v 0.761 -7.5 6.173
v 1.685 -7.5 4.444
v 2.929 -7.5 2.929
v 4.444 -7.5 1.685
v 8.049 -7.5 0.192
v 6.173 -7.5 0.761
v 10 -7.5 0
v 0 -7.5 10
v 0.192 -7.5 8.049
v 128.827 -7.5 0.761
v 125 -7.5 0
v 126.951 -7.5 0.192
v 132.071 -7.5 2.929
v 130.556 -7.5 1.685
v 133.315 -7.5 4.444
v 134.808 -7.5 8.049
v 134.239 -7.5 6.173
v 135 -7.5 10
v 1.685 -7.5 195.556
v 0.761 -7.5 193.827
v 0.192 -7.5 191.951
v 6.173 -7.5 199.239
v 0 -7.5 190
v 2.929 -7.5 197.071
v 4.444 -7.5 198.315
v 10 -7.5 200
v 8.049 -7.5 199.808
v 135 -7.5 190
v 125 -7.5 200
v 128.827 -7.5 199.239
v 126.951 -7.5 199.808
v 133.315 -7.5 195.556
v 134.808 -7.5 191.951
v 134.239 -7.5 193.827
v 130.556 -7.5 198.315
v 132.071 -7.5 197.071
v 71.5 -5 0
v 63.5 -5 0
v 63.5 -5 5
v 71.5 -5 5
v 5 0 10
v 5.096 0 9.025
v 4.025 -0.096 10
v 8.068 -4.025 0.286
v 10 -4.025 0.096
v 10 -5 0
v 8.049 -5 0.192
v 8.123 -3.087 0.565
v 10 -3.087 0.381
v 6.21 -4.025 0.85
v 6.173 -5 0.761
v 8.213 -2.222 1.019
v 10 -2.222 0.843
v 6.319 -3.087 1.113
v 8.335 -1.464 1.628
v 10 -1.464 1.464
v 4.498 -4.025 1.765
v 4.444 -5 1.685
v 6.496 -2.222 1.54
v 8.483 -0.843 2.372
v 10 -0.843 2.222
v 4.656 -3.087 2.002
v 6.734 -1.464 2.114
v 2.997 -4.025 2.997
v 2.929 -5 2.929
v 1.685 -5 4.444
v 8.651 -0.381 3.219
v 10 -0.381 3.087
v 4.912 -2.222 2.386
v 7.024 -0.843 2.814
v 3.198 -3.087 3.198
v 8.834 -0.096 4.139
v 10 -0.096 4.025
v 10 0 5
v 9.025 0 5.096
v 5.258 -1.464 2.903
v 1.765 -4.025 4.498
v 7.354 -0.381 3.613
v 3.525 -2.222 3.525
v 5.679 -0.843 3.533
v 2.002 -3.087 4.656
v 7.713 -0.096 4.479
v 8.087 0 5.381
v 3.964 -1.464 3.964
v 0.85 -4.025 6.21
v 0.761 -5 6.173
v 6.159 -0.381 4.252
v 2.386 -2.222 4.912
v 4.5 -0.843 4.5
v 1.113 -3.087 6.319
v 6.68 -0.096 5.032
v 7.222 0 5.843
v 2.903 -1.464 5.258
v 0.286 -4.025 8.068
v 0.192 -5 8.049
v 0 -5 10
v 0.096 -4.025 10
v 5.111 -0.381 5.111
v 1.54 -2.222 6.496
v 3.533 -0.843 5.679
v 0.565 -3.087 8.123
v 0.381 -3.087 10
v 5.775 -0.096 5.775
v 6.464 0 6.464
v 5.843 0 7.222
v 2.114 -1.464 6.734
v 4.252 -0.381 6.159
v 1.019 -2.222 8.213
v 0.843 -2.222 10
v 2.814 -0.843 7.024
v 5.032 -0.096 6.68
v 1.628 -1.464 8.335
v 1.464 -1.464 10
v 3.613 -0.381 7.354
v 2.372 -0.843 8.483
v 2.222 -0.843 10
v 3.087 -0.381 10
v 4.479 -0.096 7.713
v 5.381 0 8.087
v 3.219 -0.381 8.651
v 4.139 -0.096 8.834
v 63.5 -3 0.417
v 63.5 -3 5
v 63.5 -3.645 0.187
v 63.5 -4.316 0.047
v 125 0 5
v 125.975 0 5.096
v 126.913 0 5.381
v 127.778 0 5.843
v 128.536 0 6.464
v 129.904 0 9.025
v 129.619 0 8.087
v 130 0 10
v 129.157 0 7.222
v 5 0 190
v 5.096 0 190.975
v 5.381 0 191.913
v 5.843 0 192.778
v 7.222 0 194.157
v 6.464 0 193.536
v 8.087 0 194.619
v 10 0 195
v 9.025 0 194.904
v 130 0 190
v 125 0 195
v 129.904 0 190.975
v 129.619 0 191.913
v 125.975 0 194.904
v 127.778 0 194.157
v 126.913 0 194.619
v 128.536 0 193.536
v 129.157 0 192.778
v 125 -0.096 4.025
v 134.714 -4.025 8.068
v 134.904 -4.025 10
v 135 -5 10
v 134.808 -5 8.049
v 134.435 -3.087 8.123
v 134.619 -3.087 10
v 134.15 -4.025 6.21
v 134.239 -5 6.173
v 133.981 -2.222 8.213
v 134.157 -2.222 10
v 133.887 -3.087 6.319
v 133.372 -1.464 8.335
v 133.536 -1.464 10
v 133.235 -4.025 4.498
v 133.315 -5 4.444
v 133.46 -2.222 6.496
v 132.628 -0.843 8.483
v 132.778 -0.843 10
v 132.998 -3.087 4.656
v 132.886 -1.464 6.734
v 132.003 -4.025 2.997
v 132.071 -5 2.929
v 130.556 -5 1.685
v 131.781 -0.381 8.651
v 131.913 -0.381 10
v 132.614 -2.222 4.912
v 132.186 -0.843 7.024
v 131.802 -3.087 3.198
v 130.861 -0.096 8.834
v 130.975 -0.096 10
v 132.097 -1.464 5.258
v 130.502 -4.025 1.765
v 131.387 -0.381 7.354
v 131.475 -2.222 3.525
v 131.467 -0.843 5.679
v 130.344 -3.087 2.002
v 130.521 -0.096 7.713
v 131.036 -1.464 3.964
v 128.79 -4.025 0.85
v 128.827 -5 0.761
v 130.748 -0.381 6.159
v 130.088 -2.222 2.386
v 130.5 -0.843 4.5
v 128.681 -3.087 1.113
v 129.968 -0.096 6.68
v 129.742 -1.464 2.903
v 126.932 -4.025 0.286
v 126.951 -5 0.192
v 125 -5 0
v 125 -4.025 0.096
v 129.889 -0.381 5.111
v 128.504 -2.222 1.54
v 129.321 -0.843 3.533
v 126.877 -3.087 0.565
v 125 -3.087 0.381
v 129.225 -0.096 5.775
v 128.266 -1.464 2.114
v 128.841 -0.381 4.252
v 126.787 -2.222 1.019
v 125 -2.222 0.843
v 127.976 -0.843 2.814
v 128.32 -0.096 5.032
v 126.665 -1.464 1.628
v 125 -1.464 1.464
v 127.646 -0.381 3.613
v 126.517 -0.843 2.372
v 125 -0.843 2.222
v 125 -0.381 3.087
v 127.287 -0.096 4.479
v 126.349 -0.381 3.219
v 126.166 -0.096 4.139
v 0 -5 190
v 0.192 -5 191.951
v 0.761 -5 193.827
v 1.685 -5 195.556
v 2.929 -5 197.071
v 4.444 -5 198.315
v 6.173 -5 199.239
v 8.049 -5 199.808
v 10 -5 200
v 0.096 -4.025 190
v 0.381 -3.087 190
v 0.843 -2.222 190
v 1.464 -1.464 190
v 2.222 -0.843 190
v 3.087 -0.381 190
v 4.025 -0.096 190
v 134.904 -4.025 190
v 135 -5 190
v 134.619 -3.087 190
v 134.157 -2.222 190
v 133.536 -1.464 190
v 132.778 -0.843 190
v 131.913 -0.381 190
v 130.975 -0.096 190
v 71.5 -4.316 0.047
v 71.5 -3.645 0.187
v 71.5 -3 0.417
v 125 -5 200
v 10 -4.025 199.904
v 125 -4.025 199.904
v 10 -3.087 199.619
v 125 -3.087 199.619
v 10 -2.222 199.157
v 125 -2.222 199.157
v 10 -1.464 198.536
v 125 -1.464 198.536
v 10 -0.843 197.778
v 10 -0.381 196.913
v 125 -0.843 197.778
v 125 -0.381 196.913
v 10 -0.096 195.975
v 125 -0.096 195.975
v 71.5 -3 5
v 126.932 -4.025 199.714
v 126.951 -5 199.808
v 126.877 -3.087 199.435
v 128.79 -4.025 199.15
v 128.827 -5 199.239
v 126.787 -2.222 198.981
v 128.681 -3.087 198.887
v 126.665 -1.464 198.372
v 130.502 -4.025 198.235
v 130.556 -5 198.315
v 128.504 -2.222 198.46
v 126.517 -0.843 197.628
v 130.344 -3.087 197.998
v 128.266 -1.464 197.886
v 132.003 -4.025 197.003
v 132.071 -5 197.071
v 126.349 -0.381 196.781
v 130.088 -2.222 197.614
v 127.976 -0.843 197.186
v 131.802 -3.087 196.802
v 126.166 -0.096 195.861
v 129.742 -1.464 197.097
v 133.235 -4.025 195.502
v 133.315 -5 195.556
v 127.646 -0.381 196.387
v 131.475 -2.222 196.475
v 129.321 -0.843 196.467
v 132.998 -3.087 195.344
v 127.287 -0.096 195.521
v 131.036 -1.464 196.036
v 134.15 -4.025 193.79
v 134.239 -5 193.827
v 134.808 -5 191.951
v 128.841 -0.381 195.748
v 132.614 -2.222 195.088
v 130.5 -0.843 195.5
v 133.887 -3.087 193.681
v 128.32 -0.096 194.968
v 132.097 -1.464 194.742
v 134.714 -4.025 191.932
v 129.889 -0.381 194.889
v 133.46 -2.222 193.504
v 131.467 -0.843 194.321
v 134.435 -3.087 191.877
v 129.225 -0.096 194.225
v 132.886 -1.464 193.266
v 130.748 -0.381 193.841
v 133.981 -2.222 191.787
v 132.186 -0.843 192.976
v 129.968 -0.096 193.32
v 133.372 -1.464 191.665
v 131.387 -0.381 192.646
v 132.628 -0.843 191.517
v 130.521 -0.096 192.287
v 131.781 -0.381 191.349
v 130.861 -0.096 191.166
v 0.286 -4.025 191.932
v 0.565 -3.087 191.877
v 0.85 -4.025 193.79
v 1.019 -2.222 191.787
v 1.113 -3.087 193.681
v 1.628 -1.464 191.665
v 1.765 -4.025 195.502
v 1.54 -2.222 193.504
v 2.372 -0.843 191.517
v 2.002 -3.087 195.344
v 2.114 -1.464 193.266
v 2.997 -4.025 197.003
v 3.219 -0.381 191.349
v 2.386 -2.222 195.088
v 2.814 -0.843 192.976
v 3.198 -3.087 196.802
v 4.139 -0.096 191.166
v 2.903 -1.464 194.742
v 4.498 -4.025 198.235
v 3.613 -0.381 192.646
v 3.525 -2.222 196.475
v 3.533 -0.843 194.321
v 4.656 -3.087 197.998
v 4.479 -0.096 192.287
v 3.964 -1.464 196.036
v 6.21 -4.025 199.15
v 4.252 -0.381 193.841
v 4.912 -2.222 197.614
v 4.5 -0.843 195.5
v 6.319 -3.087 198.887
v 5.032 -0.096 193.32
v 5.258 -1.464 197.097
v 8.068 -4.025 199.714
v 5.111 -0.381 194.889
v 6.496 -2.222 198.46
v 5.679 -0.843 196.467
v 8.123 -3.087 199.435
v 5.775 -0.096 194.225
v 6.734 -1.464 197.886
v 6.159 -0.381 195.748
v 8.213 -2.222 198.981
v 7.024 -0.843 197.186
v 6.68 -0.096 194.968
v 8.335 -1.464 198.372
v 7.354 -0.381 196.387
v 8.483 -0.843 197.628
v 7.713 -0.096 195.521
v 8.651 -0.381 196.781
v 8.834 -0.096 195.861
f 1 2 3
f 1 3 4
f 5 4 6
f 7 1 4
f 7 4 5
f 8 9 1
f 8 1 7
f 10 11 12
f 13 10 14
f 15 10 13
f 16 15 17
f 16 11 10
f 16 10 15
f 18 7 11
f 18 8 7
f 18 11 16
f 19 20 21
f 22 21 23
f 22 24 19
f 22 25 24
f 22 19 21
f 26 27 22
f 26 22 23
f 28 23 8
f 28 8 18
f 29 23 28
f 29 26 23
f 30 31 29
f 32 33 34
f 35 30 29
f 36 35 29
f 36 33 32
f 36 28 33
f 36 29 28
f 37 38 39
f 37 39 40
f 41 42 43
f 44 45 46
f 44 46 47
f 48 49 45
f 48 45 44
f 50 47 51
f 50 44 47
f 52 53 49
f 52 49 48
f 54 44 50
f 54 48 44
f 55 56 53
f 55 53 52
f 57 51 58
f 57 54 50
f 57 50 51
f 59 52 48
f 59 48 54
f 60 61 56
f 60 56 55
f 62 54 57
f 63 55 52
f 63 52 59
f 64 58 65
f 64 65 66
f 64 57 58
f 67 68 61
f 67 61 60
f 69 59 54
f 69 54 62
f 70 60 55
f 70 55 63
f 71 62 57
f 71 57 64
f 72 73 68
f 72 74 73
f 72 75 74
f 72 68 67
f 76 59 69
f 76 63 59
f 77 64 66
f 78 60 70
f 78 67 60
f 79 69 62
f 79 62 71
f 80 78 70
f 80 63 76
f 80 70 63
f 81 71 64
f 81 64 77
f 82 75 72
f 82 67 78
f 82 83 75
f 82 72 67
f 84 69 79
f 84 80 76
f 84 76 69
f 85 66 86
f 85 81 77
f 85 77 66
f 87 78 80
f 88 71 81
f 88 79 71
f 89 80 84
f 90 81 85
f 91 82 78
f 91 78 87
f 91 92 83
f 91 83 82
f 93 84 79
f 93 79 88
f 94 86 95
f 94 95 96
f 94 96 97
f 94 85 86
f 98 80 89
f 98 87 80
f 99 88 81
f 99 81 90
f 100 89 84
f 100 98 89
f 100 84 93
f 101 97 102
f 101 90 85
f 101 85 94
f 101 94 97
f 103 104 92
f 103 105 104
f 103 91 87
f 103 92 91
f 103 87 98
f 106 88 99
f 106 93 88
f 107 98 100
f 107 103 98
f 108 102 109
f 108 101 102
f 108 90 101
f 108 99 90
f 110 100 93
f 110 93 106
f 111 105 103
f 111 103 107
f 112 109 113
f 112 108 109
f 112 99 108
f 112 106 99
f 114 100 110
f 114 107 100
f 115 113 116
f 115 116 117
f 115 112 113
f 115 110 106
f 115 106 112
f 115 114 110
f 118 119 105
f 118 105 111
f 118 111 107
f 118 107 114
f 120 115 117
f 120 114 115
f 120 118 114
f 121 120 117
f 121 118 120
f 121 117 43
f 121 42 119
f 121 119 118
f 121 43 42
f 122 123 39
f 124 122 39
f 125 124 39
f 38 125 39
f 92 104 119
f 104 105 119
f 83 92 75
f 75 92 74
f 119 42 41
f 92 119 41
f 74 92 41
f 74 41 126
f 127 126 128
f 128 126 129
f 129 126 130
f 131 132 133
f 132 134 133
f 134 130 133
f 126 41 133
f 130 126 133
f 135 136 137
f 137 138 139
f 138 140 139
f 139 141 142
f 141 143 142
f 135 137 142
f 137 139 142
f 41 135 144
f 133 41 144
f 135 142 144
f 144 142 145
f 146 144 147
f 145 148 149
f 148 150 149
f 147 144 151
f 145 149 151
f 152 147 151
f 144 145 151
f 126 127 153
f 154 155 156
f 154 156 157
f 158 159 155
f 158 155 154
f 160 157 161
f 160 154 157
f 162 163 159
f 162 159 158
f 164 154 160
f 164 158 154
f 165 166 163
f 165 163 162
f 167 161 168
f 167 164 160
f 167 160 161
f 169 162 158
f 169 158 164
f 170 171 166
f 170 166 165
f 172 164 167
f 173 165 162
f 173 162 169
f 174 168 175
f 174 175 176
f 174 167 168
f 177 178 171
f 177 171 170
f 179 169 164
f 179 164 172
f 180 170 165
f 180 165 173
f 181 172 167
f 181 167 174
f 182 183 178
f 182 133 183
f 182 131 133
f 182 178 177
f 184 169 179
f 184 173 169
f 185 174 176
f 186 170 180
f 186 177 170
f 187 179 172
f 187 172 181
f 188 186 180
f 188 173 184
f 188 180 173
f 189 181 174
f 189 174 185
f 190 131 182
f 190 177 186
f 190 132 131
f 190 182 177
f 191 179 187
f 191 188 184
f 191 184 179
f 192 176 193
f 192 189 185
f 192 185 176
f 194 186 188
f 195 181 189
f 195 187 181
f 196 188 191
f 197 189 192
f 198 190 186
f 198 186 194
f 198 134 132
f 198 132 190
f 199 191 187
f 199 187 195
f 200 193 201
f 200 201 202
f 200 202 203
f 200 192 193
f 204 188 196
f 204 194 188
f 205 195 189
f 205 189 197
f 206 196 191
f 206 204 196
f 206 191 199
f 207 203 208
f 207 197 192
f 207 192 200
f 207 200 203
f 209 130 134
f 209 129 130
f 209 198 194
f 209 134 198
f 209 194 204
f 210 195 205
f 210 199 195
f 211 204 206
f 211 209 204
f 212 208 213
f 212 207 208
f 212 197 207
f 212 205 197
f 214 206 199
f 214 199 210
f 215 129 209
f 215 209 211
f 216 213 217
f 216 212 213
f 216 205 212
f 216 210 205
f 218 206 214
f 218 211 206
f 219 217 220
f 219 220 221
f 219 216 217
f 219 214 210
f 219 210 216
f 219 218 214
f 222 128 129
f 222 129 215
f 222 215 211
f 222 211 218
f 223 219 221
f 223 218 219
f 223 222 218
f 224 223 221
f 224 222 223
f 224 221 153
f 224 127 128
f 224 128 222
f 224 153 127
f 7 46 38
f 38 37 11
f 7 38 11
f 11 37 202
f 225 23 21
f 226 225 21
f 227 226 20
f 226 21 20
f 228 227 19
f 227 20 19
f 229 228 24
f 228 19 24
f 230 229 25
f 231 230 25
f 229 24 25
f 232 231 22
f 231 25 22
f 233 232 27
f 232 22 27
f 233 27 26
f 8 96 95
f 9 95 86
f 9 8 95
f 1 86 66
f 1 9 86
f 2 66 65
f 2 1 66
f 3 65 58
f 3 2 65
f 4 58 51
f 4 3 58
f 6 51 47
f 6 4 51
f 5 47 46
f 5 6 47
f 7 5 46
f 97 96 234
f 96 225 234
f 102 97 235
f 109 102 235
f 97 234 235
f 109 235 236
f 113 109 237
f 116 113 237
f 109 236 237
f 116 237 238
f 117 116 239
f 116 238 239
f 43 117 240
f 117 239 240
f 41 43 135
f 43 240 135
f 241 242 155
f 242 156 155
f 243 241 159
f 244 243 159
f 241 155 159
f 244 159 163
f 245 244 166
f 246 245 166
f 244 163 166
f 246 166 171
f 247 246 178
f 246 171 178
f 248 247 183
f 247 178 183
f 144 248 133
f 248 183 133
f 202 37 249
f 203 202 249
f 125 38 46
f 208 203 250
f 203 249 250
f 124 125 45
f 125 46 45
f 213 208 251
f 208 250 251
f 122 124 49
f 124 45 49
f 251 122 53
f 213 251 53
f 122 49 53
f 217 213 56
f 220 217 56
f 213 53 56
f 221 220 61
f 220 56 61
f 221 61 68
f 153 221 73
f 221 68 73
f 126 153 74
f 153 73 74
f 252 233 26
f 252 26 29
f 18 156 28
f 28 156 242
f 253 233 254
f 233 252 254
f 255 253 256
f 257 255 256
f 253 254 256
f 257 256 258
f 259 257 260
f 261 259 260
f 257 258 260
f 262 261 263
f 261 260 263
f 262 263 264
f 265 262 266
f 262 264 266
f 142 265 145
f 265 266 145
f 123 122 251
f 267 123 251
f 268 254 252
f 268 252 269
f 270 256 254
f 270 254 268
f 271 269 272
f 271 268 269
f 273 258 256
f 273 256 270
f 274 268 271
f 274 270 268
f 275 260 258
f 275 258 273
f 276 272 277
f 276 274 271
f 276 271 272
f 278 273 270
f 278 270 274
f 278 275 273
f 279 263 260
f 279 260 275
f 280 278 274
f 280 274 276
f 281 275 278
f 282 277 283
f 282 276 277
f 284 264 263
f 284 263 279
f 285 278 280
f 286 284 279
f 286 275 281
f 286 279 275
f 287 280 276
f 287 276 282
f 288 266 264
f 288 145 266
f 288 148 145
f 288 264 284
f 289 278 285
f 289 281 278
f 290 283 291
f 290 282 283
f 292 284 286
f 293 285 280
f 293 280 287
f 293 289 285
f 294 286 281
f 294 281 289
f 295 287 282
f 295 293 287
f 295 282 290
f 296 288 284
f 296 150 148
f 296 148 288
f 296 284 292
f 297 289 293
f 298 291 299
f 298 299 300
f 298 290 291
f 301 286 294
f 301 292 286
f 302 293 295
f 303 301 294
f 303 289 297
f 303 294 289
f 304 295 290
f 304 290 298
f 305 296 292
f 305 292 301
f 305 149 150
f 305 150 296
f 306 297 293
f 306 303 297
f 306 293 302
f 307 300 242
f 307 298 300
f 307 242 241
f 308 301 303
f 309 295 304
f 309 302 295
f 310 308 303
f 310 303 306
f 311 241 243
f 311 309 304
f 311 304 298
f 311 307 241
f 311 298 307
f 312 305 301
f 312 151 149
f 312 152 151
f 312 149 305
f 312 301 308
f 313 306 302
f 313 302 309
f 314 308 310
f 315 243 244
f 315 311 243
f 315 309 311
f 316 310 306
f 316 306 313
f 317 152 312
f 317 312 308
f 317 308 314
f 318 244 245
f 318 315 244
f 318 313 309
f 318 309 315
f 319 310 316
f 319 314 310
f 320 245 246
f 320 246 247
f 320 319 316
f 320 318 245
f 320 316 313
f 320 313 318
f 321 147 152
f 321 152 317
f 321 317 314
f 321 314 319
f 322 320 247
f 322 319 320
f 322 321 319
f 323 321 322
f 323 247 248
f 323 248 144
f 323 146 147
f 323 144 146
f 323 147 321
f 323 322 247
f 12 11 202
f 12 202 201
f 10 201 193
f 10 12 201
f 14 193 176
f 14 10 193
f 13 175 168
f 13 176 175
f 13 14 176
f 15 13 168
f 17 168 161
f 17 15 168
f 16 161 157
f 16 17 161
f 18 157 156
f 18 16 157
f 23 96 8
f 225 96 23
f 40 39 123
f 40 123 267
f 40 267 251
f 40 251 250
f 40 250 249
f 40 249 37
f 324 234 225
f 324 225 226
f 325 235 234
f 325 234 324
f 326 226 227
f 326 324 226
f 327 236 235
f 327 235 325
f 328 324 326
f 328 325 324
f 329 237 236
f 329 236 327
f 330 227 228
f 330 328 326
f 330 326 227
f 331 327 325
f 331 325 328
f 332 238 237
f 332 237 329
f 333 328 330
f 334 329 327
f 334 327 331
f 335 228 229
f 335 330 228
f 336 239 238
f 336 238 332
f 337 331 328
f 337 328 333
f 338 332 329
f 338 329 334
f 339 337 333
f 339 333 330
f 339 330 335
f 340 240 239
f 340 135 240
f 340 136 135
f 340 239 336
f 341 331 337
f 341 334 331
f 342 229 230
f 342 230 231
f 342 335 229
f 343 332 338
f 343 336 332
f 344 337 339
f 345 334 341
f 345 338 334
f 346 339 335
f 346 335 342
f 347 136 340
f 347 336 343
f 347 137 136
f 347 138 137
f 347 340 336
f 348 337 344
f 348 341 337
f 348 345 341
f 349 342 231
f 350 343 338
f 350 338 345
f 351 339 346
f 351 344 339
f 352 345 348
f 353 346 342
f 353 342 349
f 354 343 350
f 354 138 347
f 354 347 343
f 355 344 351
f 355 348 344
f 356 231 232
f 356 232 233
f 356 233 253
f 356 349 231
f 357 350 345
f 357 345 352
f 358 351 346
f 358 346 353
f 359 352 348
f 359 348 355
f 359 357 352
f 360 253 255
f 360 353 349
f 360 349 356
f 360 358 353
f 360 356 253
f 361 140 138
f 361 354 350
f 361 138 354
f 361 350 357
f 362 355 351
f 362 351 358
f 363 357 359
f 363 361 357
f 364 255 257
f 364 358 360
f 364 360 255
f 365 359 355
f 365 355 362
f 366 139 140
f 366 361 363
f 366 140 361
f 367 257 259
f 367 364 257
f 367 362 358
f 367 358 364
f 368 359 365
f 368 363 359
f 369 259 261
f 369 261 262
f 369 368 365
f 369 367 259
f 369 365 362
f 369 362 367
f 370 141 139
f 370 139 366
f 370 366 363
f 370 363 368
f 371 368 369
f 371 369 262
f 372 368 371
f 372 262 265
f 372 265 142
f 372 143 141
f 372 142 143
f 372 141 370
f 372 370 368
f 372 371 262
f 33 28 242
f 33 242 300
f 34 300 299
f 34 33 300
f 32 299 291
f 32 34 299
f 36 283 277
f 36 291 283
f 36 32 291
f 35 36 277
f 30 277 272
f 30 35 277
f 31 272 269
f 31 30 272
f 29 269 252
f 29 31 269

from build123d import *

# Parameters (mm, degrees)
F0_W     = 135
F0_H     = 200
F1_DEPTH = 7.5
F2_R     = 10
F3_R     = 5
F4_W     = 8
F4_H     = 2
F5_DEPTH = 5


with BuildPart() as f1:
    # F0 (on Front) → F1 (new body)
    with BuildSketch(Plane.XZ):
        with Locations((67.5, 100)):
            Rectangle(F0_W, F0_H)
    extrude(amount=F1_DEPTH)

    # F2
    f2_edges = [f1.edges().sort_by_distance(p)[0] for p in [
        (0, -3.75, 200),
        (135, -3.75, 200),
        (0, -3.75, 0),
        (135, -3.75, 0),
    ]]
    fillet(f2_edges, radius=F2_R)

    # F3
    f3_edges = [f1.edges().sort_by_distance(p)[0] for p in [
        (0, 0, 100),
        (67.5, 0, 200),
        (2.928932, 0, 197.071068),
    ]]
    fillet(f3_edges, radius=F3_R)

    # F4 (on face) → F5 (cut)
    with BuildSketch(Plane(origin=(0, 0, 0), x_dir=(1, 0, 0), z_dir=(0, 0, -1))):
        with Locations((67.5, 4)):
            Rectangle(F4_W, F4_H)
    extrude(amount=-F5_DEPTH, mode=Mode.SUBTRACT)


solid = f1.part
